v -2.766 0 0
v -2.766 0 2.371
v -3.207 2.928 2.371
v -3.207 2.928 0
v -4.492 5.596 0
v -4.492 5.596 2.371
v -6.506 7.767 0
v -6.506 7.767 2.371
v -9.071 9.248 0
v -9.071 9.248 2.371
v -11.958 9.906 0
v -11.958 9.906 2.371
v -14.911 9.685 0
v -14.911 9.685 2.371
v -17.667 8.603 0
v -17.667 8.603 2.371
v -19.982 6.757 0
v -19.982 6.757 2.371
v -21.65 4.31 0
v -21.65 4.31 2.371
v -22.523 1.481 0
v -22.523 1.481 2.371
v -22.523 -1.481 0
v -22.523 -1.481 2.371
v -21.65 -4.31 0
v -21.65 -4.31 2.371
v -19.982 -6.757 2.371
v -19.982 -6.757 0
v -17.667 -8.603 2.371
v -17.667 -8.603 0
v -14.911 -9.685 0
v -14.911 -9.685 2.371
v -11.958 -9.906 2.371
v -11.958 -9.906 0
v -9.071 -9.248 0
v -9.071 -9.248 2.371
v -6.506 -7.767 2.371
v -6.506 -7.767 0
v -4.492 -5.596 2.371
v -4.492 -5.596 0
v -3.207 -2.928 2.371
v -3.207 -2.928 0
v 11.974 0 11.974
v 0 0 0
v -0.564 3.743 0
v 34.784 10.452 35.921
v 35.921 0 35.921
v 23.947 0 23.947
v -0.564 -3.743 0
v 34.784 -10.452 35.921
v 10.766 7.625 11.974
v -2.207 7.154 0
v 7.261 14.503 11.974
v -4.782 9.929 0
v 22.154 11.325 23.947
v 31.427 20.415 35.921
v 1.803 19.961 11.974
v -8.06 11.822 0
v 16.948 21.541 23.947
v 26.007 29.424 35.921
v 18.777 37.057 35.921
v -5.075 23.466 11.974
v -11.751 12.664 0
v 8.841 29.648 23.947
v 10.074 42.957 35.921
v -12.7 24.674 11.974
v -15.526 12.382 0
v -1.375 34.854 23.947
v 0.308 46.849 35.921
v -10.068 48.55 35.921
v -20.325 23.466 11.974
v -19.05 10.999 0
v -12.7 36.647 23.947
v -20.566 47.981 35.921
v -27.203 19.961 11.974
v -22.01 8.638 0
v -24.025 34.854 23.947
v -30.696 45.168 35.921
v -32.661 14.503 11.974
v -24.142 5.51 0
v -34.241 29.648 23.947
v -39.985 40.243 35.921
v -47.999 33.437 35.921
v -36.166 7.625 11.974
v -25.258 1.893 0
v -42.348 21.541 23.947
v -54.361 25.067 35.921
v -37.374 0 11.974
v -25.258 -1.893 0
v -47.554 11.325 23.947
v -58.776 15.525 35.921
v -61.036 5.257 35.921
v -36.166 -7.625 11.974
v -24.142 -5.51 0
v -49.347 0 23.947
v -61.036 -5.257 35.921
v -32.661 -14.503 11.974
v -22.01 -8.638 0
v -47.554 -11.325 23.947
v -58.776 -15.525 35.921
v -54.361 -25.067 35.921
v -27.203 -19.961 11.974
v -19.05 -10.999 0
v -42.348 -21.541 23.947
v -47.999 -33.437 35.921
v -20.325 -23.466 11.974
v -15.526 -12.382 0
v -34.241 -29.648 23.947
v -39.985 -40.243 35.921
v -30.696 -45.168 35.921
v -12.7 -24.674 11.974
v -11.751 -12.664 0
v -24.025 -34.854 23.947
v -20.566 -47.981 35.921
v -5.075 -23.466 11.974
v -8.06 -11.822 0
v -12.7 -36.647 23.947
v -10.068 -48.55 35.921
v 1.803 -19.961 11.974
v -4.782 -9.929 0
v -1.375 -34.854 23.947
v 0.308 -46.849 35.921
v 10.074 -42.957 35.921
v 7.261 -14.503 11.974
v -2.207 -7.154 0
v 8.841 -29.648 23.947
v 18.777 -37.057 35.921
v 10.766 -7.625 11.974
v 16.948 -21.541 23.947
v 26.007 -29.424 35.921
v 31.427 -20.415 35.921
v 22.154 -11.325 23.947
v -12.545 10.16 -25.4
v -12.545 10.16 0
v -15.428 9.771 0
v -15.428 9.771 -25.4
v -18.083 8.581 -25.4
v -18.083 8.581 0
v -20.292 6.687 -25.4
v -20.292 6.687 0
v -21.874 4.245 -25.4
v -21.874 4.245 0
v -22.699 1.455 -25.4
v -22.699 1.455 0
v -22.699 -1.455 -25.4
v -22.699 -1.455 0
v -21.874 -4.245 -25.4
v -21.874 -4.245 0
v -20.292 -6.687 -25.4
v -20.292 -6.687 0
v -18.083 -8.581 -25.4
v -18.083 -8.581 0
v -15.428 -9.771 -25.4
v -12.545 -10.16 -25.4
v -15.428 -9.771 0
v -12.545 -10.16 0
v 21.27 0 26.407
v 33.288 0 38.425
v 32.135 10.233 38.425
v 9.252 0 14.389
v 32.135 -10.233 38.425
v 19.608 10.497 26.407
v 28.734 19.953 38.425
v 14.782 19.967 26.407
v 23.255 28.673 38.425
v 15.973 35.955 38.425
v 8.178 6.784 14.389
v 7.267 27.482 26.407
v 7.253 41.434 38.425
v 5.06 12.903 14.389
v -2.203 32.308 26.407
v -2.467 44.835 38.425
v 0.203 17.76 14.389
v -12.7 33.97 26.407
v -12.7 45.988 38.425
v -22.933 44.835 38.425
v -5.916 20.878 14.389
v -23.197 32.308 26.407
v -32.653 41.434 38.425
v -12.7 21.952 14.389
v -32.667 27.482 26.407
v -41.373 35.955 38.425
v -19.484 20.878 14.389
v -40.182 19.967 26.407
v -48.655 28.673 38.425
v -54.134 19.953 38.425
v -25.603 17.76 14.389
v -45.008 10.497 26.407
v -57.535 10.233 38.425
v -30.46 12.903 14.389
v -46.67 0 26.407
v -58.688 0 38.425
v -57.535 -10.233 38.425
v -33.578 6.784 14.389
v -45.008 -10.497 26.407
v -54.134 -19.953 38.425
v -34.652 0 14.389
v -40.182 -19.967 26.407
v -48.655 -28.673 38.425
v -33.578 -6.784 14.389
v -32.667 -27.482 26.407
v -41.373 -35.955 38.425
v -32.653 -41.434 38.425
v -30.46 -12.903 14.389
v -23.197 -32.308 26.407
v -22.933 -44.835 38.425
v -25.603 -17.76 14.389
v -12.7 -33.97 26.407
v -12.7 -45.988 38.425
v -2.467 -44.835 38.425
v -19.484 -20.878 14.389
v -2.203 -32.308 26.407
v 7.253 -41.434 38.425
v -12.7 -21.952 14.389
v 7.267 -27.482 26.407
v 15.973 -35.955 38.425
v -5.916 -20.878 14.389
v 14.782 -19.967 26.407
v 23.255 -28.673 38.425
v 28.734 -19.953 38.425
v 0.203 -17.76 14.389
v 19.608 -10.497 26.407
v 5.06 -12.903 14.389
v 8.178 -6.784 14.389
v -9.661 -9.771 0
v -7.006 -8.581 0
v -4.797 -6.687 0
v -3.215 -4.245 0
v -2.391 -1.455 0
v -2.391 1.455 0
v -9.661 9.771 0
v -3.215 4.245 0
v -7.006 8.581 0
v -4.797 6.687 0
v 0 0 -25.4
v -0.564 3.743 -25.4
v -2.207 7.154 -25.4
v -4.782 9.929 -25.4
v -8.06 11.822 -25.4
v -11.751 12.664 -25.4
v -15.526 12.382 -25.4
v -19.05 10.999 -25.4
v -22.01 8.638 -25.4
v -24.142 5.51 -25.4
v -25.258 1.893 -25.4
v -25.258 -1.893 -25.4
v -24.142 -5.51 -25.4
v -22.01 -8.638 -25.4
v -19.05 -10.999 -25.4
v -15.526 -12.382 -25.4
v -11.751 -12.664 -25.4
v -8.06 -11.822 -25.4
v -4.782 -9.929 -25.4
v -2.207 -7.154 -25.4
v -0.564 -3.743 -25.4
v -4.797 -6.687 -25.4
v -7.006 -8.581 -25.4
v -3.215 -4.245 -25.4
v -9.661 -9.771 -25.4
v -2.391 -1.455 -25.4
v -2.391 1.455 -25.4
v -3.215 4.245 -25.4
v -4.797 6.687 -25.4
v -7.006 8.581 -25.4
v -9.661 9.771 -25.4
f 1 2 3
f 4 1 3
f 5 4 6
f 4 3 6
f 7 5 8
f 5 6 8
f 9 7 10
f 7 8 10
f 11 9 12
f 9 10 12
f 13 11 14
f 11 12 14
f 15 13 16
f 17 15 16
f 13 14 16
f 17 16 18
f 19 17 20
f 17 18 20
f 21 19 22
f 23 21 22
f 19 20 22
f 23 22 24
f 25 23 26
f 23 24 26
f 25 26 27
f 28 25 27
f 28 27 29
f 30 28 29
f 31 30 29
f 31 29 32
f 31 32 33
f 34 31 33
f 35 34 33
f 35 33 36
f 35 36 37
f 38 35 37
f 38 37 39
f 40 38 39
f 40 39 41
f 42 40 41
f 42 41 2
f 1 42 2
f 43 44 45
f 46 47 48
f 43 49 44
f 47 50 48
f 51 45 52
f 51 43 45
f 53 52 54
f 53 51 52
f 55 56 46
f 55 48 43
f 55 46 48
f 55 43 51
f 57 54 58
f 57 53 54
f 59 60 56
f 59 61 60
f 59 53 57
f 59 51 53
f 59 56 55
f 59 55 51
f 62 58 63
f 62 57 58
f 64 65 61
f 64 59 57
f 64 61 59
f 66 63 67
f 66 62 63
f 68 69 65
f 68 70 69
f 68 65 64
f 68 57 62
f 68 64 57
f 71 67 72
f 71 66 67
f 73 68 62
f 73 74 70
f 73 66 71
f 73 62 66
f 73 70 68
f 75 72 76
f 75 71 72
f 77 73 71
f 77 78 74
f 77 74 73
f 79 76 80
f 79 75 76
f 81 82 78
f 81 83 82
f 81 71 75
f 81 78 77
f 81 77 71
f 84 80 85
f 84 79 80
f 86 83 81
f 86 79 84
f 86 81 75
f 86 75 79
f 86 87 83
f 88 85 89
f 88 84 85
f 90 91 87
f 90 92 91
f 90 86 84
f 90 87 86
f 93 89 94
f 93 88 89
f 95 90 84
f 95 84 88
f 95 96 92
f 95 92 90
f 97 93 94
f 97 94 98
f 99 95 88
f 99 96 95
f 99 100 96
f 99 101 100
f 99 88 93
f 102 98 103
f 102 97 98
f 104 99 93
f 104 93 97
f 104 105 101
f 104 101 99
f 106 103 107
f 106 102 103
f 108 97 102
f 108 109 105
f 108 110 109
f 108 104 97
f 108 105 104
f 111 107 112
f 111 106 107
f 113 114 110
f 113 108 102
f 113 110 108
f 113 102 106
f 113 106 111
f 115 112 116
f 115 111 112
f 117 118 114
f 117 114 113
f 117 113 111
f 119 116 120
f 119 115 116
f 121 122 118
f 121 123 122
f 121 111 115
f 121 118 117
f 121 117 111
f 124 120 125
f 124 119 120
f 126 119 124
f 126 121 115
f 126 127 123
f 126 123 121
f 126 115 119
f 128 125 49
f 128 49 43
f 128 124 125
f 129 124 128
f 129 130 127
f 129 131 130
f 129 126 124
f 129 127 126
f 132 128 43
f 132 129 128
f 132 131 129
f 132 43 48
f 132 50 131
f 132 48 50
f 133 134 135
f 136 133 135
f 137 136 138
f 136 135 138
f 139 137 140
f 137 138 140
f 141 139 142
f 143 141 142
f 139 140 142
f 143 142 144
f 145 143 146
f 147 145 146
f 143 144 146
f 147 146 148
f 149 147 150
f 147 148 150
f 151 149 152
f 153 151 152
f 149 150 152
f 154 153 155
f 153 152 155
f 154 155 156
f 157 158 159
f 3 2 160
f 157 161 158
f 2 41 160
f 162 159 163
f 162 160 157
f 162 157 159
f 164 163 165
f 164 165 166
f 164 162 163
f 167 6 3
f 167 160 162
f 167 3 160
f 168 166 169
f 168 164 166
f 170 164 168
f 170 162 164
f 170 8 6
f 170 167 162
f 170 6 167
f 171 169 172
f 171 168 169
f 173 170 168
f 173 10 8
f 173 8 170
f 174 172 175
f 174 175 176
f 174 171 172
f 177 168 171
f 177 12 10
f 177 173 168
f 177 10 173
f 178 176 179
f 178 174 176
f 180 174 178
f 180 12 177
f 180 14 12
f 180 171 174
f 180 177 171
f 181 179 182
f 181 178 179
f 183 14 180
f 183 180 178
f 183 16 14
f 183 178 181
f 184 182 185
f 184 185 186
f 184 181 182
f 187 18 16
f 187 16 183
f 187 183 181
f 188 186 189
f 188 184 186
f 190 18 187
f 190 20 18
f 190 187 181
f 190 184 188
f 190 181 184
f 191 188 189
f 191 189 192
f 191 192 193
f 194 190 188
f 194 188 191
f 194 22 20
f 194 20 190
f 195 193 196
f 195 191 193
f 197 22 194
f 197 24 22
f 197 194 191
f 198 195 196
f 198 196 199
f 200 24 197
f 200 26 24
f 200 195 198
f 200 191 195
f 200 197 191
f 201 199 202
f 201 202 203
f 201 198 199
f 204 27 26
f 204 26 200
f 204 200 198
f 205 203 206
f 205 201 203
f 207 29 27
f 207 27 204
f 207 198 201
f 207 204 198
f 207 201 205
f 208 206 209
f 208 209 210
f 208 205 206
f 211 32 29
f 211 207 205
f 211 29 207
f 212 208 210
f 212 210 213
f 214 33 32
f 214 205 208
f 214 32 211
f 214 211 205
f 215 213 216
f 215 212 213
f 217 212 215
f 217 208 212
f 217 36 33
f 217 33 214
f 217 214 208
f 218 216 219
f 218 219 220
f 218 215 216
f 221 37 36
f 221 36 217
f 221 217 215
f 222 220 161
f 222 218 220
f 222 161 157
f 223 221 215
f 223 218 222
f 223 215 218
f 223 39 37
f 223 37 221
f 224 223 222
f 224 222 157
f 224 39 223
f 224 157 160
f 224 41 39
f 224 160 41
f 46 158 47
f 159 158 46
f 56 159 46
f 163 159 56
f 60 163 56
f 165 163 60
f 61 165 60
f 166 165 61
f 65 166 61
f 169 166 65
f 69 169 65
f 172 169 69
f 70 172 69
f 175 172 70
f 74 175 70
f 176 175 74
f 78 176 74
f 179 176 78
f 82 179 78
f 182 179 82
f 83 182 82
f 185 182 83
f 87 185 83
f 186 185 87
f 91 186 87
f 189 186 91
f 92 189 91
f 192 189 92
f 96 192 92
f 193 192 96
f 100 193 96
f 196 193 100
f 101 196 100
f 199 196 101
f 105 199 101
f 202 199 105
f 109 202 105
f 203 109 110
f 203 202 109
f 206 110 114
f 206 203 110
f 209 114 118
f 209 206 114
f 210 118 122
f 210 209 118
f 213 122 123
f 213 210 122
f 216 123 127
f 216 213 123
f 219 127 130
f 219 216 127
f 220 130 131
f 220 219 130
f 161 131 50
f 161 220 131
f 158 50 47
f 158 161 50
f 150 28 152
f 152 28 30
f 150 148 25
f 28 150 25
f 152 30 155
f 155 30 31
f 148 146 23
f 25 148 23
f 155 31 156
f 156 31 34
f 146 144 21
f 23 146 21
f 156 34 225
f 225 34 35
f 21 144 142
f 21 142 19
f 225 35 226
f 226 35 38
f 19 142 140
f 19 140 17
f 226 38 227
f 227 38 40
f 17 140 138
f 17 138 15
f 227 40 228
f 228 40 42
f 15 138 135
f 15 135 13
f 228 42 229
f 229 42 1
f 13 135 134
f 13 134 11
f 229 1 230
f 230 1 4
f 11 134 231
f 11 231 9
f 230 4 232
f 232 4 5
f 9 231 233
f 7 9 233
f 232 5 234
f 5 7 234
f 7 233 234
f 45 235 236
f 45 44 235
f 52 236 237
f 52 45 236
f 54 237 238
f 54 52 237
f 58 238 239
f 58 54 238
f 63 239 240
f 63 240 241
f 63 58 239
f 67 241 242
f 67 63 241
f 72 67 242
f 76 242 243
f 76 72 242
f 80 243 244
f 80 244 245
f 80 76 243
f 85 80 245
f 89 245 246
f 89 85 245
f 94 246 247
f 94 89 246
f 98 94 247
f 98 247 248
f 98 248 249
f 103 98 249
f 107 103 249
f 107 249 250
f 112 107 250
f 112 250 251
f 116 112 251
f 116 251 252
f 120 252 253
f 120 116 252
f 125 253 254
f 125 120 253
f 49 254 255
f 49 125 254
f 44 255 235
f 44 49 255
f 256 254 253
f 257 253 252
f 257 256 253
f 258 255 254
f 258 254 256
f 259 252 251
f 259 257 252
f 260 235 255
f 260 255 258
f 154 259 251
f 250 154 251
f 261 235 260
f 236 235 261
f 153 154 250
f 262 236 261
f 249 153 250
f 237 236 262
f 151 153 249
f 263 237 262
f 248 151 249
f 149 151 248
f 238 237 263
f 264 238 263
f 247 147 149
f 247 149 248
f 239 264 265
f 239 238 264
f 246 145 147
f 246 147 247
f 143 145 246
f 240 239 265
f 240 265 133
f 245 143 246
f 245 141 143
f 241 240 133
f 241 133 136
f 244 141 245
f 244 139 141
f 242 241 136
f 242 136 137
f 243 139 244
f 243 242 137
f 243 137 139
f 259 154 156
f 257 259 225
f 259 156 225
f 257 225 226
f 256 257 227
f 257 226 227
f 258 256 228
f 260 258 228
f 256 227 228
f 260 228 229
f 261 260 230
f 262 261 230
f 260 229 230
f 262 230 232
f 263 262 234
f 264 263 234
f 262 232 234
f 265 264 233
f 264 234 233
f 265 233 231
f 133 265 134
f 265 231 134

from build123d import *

# Parameters (mm, degrees)
F2_R     = 10.16
F3_DEPTH = 50.8
F4_R     = 10.16
F5_DEPTH = 25.4
F6_DEPTH = 25.4


with BuildPart() as f1:
    # F0 (on Front) → F1 (revolve)
    with BuildSketch(Plane.XZ):
        Polygon((0, 0), (35.9210230905, 35.921025878), (33.2881103987, 38.4245585941), (-2.765778685, 2.3706667125), (-12.7, 2.3706667125), (-12.7, -25.4), (0, -25.4), align=None)
    revolve(axis=Axis((-12.7, 0, -11.5146666437), (0, 0, 1)))

    # F2 (on Top) → F3 (cut)
    with BuildSketch(Plane.XY):
        with Locations((-12.6435561106, 0)):
            Circle(F2_R)
    extrude(amount=-F3_DEPTH, mode=Mode.SUBTRACT)

    # F4 (on Top) → F5 (cut)
    with BuildSketch(Plane.XY):
        with Locations((-12.4460002407, 0)):
            Circle(F4_R)
    extrude(amount=-F5_DEPTH, mode=Mode.SUBTRACT)

    # F6 (cut): a face of the model
    f6_faces = [f1.faces().sort_by_distance(p)[0] for p in [
        (-12.7, 0, 2.3706667125),
    ]]
    extrude(f6_faces, amount=-F6_DEPTH, mode=Mode.SUBTRACT)


solid = f1.part
